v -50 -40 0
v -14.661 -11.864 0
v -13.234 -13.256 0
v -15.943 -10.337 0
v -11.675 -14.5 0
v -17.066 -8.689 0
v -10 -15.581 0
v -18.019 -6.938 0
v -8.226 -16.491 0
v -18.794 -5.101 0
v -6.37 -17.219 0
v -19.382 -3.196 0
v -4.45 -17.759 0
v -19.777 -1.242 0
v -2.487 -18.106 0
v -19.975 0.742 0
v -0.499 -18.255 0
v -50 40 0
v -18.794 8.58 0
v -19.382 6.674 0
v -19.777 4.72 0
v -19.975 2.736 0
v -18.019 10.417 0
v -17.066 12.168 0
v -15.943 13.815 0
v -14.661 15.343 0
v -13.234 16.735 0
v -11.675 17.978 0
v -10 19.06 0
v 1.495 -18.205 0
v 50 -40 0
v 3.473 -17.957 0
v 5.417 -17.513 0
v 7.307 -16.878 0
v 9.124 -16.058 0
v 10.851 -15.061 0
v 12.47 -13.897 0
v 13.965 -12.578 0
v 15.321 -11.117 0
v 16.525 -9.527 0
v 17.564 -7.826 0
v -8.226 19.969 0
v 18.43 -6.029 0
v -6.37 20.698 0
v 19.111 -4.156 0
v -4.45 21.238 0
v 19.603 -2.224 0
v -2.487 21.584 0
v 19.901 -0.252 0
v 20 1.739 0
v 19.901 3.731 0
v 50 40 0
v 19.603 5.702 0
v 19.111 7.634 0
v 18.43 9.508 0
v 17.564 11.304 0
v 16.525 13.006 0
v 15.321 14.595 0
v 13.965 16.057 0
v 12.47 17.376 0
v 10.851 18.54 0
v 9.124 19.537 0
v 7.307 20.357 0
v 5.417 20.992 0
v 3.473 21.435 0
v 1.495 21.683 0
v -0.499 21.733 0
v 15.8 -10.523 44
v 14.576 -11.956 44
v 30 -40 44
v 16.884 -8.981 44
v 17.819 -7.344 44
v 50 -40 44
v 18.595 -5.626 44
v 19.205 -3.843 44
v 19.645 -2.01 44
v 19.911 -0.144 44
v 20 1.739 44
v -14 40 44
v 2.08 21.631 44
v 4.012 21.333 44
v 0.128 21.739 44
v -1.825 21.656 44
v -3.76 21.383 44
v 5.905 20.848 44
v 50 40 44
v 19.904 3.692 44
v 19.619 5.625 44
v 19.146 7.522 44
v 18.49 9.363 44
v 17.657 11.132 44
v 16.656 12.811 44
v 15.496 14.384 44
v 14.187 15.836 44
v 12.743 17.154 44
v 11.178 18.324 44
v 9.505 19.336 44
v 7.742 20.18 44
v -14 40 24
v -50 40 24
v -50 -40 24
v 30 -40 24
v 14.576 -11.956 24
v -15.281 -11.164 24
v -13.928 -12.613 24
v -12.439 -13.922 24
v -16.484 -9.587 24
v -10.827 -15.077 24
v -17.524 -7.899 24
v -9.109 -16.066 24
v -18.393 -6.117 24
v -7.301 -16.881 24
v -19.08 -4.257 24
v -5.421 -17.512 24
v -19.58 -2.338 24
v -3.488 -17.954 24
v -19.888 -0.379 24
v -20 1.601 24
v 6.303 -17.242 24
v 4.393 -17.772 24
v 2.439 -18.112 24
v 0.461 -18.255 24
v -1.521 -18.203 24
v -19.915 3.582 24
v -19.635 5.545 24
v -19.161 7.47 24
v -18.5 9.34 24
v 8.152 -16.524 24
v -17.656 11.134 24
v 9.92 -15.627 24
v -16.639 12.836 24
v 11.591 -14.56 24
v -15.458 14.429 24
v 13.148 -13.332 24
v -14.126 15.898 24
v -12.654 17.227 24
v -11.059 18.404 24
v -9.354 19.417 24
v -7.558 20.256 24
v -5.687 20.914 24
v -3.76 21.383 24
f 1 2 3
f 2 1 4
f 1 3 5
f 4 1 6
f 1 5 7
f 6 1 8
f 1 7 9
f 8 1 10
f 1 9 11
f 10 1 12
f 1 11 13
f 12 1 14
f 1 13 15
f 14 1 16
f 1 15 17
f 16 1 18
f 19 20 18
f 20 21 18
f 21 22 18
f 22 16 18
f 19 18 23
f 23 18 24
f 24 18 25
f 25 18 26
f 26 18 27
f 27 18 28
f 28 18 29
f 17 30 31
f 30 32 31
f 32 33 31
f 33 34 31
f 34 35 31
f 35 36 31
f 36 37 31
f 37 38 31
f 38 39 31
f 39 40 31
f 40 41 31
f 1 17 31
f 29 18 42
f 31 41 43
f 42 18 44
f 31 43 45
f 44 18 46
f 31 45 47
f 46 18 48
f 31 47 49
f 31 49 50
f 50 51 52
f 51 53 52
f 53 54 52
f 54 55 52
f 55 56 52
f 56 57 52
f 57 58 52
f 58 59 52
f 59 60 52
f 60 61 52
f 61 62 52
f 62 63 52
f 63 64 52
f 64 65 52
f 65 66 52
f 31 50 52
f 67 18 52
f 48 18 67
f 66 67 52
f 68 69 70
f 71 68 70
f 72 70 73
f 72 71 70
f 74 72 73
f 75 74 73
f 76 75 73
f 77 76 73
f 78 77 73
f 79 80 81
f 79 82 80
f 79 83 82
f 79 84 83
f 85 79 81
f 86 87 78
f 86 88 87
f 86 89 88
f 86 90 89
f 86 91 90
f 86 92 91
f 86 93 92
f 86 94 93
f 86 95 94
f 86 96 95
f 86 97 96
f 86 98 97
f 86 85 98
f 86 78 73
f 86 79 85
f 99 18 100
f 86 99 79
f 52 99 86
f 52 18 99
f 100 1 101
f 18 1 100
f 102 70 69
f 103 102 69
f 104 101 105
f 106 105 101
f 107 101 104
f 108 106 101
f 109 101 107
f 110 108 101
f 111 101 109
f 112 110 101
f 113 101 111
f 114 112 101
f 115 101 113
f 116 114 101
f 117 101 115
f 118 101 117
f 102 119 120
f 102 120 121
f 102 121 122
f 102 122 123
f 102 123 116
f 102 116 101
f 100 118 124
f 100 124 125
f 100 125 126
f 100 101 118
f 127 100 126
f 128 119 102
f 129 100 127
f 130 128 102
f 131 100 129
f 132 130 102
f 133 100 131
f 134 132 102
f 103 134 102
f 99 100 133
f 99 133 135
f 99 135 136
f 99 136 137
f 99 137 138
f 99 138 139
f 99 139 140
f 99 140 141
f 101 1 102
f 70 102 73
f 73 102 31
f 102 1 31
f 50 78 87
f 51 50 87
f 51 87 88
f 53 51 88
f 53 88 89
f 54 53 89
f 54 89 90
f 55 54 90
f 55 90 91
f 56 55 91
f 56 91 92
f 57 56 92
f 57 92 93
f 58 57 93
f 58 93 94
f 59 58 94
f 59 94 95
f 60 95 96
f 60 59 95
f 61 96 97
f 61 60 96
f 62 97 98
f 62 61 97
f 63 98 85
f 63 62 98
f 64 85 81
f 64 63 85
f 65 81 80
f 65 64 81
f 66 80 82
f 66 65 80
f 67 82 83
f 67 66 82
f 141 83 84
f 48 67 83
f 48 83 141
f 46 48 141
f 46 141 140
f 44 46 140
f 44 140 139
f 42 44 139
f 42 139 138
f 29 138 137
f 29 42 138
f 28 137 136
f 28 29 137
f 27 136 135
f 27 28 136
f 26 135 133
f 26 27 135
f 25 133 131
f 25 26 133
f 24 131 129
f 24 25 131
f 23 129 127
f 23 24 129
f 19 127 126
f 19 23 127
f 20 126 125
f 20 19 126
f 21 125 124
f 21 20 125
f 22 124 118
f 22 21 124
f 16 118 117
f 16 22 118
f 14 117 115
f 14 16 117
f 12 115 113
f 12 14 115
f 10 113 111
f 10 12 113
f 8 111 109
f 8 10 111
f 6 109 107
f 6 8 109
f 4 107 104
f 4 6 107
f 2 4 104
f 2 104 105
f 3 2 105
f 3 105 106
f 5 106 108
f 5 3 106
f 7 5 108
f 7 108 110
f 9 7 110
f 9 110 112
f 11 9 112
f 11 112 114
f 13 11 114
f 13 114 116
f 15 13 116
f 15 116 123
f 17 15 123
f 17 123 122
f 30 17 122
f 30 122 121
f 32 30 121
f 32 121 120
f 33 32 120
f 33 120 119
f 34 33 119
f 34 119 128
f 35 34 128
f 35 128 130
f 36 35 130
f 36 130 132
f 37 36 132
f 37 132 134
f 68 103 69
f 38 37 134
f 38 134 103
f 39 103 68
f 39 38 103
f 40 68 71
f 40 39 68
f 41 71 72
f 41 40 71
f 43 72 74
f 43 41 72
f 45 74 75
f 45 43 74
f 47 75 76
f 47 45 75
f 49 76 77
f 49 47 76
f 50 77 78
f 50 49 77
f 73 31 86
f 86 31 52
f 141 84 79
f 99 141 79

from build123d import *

# Parameters (mm, degrees)
F0_W     = 100
F0_H     = 80
F0_R     = 20
F1_DEPTH = 44
F2_DEPTH = 44
F4_DEPTH = 20


with BuildPart() as f1:
    # F0 (on Top) → F1 (new body)
    with BuildSketch(Plane.XY):
        Rectangle(F0_W, F0_H)
        with Locations((0, 1.739223)):
            Circle(F0_R, mode=Mode.SUBTRACT)
    extrude(amount=F1_DEPTH)

    # F0 (on Top) → F2 (join)
    with BuildSketch(Plane.XY):
        Rectangle(F0_W, F0_H)
        with Locations((0, 1.739223)):
            Circle(F0_R, mode=Mode.SUBTRACT)
    extrude(amount=F2_DEPTH)

    # F3 (on face) → F4 (cut)
    with BuildSketch(Plane.XY.offset(44)):
        with BuildLine():
            Line((-3.760391, 21.382529), (-14, 40))
            Line((-14, 40), (-50, 40))
            Line((-50, 40), (-50, -40))
            Line((-50, -40), (30, -40))
            Line((30, -40), (14.575634, -11.955699))
            ThreePointArc((14.575634, -11.955699), (-17.524318, -7.899152), (-3.760391, 21.382529))
        make_face()
    extrude(amount=-F4_DEPTH, mode=Mode.SUBTRACT)


solid = f1.part
